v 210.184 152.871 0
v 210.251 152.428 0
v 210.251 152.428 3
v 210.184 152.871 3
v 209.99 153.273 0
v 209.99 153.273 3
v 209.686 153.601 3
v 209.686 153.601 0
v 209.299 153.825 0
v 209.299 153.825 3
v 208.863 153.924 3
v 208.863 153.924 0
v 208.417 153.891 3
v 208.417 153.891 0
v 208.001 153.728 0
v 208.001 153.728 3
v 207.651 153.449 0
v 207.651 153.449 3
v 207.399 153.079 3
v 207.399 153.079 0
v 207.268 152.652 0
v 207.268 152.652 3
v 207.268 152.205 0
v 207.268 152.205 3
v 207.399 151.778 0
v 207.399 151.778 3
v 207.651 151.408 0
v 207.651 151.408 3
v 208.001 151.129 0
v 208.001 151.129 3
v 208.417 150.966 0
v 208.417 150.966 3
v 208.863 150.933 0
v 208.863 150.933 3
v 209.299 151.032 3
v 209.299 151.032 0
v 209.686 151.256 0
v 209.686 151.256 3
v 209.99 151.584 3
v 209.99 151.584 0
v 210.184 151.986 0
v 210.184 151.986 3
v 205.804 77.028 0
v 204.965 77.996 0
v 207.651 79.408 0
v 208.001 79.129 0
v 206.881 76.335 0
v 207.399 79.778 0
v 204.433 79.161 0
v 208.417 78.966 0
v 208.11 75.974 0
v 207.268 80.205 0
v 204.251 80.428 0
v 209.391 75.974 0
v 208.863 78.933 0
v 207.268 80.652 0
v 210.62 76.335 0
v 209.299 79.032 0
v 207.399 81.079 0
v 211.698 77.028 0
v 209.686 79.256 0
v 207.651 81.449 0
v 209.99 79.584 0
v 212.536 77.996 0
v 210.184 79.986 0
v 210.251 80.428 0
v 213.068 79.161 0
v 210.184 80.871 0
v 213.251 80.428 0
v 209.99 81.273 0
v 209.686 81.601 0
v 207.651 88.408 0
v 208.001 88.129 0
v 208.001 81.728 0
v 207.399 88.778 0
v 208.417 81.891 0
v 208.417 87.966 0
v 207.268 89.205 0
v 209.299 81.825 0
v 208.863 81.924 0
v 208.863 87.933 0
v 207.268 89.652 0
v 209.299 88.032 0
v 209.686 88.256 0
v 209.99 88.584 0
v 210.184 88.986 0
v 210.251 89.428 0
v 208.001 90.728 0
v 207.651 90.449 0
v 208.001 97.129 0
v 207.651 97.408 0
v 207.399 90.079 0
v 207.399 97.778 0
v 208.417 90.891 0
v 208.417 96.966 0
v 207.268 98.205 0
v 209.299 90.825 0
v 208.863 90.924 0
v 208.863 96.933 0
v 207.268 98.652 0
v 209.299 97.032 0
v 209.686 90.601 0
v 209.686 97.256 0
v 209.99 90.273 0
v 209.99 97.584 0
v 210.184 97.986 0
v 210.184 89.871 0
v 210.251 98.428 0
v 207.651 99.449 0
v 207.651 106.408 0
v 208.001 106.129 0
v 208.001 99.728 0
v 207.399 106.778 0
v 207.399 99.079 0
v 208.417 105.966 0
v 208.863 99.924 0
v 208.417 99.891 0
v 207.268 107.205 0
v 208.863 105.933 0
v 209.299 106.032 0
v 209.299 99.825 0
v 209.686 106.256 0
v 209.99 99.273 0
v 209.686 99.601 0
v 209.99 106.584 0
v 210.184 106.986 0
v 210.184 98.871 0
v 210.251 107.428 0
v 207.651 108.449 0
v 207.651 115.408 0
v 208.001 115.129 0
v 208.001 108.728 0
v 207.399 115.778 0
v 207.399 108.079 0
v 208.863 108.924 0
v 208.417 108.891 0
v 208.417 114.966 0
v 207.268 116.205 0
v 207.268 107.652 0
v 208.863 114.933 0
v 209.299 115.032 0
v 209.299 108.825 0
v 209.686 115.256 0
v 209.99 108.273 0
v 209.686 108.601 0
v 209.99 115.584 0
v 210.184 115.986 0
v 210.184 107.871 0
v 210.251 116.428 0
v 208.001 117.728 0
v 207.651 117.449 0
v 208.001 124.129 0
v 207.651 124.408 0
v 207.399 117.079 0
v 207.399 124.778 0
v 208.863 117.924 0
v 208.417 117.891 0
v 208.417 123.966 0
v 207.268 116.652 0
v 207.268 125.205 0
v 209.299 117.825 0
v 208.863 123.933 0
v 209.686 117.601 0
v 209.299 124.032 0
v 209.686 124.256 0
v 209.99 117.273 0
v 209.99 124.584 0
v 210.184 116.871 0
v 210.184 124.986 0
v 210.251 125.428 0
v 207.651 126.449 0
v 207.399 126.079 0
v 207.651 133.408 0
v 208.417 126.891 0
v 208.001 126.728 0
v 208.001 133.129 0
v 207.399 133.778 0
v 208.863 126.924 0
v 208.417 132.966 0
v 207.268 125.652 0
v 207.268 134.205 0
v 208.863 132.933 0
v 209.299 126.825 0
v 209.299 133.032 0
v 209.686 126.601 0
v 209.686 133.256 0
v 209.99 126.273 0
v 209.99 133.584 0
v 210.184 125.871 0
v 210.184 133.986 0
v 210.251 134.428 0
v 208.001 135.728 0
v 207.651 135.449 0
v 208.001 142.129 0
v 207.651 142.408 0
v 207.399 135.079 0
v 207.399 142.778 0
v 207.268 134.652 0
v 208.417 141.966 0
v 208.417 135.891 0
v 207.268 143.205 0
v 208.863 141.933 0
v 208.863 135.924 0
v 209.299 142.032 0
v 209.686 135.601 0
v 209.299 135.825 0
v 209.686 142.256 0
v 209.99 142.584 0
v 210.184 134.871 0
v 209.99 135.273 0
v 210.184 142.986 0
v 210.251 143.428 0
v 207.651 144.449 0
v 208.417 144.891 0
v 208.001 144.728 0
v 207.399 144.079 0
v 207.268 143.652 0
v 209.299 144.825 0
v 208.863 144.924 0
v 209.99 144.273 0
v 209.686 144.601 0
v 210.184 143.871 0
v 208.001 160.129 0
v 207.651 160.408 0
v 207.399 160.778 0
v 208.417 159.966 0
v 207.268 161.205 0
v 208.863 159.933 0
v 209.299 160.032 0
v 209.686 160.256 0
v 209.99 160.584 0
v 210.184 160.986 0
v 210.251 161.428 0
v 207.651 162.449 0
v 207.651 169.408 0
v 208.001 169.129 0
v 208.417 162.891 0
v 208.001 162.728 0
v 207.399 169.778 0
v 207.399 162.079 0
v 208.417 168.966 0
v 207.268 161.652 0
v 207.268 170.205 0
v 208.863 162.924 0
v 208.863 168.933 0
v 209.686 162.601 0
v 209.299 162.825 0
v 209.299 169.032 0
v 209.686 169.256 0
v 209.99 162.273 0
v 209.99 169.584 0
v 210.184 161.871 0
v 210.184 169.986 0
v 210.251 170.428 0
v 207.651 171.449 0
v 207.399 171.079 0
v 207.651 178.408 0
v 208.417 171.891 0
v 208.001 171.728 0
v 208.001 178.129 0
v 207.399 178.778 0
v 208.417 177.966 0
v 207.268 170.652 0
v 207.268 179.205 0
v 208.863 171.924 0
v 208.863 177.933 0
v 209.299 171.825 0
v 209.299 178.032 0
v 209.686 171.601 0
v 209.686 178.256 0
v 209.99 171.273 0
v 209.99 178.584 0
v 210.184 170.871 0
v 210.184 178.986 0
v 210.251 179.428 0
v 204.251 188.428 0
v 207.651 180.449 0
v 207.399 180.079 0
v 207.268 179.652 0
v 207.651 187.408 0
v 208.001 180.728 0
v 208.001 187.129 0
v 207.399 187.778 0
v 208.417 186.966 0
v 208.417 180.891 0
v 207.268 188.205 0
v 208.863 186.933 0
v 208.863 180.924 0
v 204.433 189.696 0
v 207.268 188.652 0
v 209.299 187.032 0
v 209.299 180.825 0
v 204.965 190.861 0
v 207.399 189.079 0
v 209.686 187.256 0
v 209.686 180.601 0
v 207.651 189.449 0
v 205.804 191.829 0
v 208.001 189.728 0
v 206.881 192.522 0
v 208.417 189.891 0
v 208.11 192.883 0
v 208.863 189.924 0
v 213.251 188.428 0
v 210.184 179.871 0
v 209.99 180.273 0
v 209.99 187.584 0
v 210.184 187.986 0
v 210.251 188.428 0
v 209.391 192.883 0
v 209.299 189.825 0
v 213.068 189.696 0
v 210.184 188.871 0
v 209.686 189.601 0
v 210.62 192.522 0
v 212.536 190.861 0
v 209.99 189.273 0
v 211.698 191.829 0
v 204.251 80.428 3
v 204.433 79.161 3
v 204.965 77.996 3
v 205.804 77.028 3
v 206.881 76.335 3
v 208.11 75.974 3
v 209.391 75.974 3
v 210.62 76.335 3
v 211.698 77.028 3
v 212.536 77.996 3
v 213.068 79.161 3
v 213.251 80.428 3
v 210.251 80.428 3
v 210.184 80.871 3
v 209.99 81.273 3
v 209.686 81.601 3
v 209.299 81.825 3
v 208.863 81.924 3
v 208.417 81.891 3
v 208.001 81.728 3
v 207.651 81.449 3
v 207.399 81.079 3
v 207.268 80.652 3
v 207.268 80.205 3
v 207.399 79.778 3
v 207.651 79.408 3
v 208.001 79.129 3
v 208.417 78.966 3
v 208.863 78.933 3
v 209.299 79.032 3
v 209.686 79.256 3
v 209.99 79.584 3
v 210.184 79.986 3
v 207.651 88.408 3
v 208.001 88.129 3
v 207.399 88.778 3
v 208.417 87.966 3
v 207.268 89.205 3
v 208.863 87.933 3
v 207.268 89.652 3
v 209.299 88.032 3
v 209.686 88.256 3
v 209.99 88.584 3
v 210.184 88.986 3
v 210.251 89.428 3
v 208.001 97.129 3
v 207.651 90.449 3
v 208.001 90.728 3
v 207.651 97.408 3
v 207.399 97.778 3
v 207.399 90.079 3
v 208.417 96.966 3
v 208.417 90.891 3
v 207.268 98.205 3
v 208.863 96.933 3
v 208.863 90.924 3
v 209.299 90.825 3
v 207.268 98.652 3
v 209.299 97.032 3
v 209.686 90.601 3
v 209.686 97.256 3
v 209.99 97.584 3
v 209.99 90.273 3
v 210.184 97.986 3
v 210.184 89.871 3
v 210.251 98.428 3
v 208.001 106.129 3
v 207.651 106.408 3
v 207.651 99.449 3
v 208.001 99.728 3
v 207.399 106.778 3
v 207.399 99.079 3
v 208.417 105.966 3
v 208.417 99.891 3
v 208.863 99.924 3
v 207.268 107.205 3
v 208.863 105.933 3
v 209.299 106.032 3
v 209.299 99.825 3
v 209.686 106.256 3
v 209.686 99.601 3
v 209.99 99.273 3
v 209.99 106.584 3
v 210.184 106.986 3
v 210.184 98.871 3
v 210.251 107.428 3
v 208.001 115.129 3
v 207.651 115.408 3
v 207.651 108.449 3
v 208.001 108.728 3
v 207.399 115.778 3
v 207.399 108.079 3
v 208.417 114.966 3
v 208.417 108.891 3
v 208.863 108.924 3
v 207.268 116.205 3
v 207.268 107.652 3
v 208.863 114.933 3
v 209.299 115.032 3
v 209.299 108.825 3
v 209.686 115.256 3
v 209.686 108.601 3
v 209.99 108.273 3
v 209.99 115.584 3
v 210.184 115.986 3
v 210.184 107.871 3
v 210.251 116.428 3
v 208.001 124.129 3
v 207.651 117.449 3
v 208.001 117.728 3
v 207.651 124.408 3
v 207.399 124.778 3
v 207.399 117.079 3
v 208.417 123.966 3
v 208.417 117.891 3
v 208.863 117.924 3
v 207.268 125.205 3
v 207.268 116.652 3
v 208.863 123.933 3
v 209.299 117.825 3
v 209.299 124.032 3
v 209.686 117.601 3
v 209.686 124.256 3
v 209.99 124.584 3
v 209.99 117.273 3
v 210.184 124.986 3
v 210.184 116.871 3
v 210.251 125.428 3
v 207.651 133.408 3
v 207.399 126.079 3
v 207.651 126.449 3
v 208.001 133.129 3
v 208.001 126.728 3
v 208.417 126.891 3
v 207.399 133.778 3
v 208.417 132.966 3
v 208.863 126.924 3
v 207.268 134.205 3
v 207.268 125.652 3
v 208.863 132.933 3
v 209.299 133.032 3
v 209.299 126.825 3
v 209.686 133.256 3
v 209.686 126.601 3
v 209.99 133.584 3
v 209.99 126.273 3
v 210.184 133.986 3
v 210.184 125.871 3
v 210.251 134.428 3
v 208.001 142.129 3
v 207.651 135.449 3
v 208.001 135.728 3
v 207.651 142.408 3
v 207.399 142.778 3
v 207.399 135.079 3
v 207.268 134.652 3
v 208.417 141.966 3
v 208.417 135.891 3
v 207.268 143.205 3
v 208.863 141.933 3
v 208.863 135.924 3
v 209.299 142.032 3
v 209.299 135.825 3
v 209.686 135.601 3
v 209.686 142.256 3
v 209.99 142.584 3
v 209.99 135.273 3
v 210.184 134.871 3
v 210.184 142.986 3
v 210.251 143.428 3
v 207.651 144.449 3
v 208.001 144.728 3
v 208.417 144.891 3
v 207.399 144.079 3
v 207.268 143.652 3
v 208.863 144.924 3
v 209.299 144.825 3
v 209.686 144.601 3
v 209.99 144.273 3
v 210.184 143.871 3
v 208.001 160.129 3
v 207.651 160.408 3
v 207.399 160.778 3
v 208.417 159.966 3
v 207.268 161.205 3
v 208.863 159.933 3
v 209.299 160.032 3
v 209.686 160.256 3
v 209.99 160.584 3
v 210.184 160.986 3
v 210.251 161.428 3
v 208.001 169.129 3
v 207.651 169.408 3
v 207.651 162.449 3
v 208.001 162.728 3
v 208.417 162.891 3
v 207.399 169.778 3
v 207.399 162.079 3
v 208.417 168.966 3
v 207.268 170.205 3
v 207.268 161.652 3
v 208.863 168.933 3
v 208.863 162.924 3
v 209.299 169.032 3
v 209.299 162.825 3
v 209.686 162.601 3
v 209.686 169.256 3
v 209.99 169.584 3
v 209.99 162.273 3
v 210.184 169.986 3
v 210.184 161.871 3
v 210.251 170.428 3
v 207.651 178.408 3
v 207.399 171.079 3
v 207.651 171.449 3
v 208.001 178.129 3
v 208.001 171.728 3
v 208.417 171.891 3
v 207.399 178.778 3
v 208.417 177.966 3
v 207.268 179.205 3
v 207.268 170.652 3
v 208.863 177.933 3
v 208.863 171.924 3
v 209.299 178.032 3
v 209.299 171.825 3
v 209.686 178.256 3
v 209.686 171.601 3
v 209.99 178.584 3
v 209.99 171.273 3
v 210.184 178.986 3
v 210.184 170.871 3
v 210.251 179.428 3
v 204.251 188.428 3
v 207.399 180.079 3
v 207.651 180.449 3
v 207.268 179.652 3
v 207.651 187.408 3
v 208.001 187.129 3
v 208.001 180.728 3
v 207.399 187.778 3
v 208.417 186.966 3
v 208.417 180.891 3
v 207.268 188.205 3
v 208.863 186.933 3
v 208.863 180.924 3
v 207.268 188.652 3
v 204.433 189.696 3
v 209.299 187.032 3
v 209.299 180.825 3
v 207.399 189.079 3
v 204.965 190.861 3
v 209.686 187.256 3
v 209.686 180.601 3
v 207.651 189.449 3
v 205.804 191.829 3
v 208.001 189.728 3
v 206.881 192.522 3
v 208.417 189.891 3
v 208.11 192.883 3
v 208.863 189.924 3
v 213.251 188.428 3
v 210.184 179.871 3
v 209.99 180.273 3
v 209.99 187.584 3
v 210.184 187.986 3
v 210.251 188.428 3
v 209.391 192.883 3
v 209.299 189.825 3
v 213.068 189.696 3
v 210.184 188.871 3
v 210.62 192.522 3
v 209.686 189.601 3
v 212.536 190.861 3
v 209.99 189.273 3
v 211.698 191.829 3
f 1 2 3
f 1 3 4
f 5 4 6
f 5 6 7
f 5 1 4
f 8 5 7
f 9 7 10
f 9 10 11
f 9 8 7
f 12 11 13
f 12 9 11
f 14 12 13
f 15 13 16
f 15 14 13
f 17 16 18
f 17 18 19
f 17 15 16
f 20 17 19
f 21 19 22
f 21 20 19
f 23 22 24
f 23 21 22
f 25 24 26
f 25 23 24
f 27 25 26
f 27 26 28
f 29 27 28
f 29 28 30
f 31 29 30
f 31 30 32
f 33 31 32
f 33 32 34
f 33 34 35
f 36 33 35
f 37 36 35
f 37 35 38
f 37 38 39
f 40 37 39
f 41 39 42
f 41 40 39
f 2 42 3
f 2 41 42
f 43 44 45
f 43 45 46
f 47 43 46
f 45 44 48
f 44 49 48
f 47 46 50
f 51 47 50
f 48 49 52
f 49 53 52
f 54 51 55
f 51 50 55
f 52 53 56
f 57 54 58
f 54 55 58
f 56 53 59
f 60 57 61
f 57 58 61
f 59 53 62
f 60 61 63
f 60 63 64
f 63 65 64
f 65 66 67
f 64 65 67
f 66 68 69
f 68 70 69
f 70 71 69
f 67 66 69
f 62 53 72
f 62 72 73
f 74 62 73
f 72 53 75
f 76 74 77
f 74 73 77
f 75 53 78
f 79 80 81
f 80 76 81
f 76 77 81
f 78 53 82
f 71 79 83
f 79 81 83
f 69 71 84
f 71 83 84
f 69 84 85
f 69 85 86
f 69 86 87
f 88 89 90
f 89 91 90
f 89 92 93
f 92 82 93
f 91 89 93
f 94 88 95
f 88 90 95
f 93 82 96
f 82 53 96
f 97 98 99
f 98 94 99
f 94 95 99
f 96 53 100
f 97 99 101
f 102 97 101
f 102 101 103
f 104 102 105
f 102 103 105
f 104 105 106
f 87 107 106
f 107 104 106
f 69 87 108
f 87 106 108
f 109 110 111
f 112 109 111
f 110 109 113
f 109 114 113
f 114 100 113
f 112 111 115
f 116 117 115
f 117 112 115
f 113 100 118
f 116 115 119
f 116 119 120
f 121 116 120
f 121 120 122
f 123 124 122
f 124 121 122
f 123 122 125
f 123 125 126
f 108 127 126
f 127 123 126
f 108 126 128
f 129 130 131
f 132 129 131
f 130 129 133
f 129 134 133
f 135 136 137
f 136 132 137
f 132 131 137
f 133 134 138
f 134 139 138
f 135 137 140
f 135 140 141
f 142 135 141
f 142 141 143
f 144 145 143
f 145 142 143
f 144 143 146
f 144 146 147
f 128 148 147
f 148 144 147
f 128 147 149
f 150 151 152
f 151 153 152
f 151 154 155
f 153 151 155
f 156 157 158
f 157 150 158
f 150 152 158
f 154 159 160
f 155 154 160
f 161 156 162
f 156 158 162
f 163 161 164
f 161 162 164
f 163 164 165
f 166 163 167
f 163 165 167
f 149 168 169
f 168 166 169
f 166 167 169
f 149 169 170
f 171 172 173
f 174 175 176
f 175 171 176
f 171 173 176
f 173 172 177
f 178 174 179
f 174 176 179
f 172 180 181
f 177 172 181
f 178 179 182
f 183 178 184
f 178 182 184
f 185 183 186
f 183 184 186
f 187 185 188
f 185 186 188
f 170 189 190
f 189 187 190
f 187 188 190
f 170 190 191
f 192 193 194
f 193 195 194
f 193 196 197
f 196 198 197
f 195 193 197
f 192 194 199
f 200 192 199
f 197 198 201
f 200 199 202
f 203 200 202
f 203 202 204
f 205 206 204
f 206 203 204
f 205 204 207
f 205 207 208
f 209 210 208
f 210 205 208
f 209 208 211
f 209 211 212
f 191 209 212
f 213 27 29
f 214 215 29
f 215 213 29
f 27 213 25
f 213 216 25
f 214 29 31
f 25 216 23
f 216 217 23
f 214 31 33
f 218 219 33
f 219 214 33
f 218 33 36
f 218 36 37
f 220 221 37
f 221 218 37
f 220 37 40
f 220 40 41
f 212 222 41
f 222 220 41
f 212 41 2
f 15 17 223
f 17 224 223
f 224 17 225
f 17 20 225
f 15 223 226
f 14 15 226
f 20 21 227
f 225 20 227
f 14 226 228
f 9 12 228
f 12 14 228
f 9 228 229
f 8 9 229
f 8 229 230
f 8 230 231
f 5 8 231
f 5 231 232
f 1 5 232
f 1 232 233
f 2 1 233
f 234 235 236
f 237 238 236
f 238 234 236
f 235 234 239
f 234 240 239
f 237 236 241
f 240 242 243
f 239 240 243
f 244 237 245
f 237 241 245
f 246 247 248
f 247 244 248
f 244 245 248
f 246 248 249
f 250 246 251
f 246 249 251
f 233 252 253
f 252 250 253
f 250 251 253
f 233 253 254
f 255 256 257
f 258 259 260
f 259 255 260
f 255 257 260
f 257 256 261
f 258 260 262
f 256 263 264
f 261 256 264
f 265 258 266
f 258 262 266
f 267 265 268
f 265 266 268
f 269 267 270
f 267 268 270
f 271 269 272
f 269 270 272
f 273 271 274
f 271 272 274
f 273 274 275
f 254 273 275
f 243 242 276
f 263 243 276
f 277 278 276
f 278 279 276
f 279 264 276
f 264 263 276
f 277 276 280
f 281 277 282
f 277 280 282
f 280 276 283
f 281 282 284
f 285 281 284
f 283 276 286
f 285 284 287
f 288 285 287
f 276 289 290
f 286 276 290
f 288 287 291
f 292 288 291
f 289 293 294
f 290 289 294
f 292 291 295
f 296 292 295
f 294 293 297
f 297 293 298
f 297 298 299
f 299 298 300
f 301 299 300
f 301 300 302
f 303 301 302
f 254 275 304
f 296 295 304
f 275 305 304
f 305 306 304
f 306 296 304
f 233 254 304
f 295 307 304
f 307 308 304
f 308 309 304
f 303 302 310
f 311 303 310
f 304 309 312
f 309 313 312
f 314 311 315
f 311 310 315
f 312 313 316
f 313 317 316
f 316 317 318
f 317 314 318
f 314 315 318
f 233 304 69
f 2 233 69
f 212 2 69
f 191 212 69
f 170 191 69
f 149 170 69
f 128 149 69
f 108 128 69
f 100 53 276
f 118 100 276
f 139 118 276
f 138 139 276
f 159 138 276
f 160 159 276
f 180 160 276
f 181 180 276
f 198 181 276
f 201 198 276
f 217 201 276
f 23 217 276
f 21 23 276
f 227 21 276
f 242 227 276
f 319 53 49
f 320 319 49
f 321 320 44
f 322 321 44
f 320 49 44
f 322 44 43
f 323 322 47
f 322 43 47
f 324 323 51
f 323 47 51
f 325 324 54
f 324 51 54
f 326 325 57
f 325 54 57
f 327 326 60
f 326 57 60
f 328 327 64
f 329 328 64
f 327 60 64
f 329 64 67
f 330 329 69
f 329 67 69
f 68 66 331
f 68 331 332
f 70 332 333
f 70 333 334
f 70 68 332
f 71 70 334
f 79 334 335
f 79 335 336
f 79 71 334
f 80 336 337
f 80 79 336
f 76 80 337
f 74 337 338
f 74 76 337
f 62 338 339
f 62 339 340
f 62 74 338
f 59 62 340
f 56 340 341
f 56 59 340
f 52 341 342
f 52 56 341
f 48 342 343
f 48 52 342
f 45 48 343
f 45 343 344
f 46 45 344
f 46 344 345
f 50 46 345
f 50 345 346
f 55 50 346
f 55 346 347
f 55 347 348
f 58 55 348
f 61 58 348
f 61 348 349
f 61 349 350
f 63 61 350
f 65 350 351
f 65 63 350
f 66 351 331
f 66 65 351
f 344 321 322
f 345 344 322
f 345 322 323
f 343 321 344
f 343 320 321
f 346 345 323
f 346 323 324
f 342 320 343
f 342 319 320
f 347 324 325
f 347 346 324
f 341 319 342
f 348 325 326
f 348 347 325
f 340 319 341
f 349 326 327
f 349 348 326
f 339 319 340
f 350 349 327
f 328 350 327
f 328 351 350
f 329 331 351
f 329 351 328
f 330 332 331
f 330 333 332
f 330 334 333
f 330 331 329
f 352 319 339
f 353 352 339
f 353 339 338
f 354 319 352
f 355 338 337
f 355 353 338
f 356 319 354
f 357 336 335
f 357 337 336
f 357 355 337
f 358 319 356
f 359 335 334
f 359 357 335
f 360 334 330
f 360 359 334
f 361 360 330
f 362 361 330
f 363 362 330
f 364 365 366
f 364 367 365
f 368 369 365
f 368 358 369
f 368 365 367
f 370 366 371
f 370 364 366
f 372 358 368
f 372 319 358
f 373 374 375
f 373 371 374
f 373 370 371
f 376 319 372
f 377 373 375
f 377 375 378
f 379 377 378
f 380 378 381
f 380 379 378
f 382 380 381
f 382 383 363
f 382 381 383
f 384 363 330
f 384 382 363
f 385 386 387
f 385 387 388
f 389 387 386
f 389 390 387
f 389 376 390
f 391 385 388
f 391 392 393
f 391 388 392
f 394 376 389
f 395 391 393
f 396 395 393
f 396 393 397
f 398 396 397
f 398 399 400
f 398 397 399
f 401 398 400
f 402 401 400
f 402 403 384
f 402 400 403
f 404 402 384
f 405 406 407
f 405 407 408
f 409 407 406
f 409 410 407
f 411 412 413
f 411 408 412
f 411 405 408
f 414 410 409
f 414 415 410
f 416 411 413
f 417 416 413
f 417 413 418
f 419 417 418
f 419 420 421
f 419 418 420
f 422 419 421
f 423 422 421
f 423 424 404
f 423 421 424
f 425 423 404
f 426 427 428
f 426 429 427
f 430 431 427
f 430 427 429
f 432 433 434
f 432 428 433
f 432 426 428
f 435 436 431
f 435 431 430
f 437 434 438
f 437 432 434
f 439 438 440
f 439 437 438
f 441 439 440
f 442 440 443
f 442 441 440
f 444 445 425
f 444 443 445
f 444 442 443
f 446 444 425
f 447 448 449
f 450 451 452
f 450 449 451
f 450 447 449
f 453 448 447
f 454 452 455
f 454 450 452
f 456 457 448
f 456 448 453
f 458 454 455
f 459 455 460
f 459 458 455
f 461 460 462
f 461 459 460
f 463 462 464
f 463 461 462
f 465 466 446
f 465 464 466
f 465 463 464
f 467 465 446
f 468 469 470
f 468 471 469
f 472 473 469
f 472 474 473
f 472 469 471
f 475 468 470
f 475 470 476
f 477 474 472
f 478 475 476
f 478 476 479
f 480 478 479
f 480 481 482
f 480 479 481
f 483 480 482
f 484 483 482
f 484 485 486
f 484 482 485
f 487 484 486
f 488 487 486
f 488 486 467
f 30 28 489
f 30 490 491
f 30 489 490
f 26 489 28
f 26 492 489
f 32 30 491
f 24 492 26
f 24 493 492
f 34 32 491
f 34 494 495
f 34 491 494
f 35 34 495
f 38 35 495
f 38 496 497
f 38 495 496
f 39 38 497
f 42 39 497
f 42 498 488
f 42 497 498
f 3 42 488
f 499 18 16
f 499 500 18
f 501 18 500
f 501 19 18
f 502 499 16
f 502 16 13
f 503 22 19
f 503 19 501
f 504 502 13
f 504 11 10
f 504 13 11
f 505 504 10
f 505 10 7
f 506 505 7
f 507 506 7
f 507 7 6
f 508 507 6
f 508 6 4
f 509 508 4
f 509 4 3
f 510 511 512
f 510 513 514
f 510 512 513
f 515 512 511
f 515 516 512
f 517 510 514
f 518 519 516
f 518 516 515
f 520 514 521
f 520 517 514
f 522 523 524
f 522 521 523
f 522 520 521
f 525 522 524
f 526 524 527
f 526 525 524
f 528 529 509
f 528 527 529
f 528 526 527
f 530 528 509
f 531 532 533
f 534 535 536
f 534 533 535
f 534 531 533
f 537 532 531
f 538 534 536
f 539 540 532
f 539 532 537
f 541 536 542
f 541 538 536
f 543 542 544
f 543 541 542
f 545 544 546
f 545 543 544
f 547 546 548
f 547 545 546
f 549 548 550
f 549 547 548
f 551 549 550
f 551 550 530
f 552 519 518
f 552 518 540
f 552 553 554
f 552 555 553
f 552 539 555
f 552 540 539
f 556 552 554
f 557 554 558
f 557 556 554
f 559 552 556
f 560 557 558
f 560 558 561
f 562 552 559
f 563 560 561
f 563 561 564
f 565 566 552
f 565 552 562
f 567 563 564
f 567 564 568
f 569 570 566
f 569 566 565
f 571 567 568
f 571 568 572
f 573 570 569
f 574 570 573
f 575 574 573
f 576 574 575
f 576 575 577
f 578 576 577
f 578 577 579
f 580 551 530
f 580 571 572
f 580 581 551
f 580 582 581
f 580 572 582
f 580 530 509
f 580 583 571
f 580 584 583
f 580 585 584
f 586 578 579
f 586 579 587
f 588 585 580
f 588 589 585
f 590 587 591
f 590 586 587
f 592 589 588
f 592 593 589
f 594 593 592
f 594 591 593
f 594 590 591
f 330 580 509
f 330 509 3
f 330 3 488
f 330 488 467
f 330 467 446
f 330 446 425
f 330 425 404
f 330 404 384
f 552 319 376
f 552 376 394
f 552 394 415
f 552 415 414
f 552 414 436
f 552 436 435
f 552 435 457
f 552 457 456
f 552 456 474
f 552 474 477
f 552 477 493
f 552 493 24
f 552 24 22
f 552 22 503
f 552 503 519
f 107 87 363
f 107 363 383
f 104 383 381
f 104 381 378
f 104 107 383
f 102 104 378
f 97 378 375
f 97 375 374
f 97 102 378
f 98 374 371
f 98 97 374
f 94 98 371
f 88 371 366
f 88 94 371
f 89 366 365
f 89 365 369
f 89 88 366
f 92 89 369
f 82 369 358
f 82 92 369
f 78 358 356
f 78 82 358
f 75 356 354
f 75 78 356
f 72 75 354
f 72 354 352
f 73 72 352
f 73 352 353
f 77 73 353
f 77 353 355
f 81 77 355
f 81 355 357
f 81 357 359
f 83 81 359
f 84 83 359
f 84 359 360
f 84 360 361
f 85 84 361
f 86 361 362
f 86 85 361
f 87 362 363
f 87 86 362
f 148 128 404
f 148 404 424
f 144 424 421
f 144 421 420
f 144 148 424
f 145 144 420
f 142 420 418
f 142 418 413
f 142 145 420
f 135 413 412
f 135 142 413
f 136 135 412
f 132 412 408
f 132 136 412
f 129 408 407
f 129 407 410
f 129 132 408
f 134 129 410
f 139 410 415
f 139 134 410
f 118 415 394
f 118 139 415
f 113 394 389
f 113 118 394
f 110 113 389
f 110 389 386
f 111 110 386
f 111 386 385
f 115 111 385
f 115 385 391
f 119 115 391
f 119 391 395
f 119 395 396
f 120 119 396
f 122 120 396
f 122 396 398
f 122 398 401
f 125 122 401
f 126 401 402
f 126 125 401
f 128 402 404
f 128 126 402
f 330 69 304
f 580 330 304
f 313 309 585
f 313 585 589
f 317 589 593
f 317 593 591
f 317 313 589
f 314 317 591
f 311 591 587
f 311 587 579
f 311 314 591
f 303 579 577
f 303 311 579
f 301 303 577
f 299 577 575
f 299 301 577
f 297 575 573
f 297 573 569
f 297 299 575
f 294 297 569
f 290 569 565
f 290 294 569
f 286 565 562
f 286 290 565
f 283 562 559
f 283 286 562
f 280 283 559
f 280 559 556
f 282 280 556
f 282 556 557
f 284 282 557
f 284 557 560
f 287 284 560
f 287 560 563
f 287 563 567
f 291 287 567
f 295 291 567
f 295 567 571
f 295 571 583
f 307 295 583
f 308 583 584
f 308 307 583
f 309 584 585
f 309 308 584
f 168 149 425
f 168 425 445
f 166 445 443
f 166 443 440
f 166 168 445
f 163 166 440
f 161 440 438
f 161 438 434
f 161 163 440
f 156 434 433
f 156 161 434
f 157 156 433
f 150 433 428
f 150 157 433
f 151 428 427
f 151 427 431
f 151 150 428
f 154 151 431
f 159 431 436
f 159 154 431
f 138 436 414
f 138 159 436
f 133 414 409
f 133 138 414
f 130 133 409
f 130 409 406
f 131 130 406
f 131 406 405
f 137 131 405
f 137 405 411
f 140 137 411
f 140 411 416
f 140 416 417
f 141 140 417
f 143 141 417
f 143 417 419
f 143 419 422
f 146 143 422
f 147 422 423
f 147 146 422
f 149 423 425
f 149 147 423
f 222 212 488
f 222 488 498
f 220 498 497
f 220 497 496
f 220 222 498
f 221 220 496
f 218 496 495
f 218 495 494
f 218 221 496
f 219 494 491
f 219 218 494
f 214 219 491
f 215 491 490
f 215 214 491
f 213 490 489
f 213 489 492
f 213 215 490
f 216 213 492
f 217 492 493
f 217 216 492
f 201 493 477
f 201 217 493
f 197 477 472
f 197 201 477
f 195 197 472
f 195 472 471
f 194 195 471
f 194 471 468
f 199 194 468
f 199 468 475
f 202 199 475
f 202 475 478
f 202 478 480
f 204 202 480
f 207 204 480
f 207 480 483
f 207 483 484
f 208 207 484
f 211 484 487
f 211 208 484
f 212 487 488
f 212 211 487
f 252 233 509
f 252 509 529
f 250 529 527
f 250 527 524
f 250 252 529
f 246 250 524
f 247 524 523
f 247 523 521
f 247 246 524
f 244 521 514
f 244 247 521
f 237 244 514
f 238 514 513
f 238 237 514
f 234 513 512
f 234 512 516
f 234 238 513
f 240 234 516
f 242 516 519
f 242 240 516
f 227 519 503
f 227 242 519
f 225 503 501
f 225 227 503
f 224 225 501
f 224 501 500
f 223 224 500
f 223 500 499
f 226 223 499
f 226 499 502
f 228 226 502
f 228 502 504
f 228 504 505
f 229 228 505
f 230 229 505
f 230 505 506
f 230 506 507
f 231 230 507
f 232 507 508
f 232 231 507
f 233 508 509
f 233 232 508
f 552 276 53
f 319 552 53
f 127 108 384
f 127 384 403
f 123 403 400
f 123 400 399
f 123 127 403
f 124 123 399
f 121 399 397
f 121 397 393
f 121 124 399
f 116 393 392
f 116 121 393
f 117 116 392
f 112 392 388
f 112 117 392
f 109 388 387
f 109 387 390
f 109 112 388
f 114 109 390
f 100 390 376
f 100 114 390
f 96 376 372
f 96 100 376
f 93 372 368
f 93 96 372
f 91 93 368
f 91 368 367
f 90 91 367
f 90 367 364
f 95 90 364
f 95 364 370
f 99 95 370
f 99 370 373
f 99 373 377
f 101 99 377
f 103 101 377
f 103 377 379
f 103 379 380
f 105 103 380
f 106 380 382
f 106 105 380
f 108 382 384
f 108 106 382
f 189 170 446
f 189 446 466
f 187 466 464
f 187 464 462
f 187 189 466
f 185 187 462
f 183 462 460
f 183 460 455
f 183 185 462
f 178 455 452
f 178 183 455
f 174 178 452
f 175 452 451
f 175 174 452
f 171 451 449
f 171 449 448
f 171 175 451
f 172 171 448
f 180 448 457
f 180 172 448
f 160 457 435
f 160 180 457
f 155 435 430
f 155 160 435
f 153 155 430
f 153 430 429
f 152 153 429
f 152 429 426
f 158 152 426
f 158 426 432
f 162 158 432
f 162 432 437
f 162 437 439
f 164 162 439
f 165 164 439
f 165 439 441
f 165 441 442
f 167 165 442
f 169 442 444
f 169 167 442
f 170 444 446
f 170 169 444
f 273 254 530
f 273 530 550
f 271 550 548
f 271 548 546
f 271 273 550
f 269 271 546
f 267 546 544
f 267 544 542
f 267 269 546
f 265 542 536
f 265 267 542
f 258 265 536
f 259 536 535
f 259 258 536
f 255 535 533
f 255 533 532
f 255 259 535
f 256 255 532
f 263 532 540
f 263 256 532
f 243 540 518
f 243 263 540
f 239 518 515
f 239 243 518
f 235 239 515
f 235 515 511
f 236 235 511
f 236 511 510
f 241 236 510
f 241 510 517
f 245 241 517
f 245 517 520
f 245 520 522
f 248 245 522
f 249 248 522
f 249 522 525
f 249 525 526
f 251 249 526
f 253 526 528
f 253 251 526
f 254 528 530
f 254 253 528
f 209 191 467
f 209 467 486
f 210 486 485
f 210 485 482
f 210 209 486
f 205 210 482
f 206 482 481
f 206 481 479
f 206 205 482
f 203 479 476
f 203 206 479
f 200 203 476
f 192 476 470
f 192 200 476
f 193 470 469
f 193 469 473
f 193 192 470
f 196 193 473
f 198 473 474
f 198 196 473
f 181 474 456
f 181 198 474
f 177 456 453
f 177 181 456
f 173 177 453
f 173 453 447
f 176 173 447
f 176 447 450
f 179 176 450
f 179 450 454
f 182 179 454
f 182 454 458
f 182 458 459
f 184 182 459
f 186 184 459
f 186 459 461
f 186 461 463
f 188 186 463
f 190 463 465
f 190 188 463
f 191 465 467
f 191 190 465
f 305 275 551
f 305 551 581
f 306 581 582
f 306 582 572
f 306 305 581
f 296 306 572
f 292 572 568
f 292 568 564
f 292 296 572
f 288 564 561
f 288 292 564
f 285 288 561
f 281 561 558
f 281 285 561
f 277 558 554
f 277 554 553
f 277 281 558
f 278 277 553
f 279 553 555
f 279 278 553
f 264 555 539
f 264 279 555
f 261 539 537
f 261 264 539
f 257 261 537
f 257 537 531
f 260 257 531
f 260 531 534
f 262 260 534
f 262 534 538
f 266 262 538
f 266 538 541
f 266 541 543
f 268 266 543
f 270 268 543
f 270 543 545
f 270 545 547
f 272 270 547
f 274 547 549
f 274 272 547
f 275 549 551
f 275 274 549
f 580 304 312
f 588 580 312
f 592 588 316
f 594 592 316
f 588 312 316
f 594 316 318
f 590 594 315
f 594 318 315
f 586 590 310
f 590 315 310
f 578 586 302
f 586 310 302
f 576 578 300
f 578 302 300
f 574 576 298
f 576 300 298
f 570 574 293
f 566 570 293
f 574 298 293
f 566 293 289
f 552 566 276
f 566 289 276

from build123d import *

# Parameters (mm, degrees)
MODEL_R                 = 1.5
SALIENTE_EXTRUIR1_DEPTH = 3


with BuildPart() as part:
    # Model → Saliente-Extruir1 (new body)
    with BuildSketch(Plane.XY):
        with BuildLine():
            Line((213.25077615, 80.428489513), (213.25077615, 188.428489513))
            ThreePointArc((213.25077615, 188.428489513), (208.75077615, 192.928489513), (204.25077615, 188.428489513))
            Line((204.25077615, 188.428489513), (204.25077615, 80.428489513))
            ThreePointArc((204.25077615, 80.428489513), (208.75077615, 75.928489513), (213.25077615, 80.428489513))
        make_face()
        with Locations((208.75077615, 179.428489513)):
            Circle(MODEL_R, mode=Mode.SUBTRACT)
        with Locations((208.75077615, 188.428489513)):
            Circle(MODEL_R, mode=Mode.SUBTRACT)
        with Locations((208.75077615, 152.428489513)):
            Circle(MODEL_R, mode=Mode.SUBTRACT)
        with Locations((208.75077615, 161.428489513)):
            Circle(MODEL_R, mode=Mode.SUBTRACT)
        with Locations((208.75077615, 170.428489513)):
            Circle(MODEL_R, mode=Mode.SUBTRACT)
        with Locations((208.75077615, 143.428489513)):
            Circle(MODEL_R, mode=Mode.SUBTRACT)
        with Locations((208.75077615, 116.428489513)):
            Circle(MODEL_R, mode=Mode.SUBTRACT)
        with Locations((208.75077615, 125.428489513)):
            Circle(MODEL_R, mode=Mode.SUBTRACT)
        with Locations((208.75077615, 134.428489513)):
            Circle(MODEL_R, mode=Mode.SUBTRACT)
        with Locations((208.75077615, 80.428489513)):
            Circle(MODEL_R, mode=Mode.SUBTRACT)
        with Locations((208.75077615, 89.428489513)):
            Circle(MODEL_R, mode=Mode.SUBTRACT)
        with Locations((208.75077615, 98.428489513)):
            Circle(MODEL_R, mode=Mode.SUBTRACT)
        with Locations((208.75077615, 107.428489513)):
            Circle(MODEL_R, mode=Mode.SUBTRACT)
    extrude(amount=SALIENTE_EXTRUIR1_DEPTH)


solid = part.part
